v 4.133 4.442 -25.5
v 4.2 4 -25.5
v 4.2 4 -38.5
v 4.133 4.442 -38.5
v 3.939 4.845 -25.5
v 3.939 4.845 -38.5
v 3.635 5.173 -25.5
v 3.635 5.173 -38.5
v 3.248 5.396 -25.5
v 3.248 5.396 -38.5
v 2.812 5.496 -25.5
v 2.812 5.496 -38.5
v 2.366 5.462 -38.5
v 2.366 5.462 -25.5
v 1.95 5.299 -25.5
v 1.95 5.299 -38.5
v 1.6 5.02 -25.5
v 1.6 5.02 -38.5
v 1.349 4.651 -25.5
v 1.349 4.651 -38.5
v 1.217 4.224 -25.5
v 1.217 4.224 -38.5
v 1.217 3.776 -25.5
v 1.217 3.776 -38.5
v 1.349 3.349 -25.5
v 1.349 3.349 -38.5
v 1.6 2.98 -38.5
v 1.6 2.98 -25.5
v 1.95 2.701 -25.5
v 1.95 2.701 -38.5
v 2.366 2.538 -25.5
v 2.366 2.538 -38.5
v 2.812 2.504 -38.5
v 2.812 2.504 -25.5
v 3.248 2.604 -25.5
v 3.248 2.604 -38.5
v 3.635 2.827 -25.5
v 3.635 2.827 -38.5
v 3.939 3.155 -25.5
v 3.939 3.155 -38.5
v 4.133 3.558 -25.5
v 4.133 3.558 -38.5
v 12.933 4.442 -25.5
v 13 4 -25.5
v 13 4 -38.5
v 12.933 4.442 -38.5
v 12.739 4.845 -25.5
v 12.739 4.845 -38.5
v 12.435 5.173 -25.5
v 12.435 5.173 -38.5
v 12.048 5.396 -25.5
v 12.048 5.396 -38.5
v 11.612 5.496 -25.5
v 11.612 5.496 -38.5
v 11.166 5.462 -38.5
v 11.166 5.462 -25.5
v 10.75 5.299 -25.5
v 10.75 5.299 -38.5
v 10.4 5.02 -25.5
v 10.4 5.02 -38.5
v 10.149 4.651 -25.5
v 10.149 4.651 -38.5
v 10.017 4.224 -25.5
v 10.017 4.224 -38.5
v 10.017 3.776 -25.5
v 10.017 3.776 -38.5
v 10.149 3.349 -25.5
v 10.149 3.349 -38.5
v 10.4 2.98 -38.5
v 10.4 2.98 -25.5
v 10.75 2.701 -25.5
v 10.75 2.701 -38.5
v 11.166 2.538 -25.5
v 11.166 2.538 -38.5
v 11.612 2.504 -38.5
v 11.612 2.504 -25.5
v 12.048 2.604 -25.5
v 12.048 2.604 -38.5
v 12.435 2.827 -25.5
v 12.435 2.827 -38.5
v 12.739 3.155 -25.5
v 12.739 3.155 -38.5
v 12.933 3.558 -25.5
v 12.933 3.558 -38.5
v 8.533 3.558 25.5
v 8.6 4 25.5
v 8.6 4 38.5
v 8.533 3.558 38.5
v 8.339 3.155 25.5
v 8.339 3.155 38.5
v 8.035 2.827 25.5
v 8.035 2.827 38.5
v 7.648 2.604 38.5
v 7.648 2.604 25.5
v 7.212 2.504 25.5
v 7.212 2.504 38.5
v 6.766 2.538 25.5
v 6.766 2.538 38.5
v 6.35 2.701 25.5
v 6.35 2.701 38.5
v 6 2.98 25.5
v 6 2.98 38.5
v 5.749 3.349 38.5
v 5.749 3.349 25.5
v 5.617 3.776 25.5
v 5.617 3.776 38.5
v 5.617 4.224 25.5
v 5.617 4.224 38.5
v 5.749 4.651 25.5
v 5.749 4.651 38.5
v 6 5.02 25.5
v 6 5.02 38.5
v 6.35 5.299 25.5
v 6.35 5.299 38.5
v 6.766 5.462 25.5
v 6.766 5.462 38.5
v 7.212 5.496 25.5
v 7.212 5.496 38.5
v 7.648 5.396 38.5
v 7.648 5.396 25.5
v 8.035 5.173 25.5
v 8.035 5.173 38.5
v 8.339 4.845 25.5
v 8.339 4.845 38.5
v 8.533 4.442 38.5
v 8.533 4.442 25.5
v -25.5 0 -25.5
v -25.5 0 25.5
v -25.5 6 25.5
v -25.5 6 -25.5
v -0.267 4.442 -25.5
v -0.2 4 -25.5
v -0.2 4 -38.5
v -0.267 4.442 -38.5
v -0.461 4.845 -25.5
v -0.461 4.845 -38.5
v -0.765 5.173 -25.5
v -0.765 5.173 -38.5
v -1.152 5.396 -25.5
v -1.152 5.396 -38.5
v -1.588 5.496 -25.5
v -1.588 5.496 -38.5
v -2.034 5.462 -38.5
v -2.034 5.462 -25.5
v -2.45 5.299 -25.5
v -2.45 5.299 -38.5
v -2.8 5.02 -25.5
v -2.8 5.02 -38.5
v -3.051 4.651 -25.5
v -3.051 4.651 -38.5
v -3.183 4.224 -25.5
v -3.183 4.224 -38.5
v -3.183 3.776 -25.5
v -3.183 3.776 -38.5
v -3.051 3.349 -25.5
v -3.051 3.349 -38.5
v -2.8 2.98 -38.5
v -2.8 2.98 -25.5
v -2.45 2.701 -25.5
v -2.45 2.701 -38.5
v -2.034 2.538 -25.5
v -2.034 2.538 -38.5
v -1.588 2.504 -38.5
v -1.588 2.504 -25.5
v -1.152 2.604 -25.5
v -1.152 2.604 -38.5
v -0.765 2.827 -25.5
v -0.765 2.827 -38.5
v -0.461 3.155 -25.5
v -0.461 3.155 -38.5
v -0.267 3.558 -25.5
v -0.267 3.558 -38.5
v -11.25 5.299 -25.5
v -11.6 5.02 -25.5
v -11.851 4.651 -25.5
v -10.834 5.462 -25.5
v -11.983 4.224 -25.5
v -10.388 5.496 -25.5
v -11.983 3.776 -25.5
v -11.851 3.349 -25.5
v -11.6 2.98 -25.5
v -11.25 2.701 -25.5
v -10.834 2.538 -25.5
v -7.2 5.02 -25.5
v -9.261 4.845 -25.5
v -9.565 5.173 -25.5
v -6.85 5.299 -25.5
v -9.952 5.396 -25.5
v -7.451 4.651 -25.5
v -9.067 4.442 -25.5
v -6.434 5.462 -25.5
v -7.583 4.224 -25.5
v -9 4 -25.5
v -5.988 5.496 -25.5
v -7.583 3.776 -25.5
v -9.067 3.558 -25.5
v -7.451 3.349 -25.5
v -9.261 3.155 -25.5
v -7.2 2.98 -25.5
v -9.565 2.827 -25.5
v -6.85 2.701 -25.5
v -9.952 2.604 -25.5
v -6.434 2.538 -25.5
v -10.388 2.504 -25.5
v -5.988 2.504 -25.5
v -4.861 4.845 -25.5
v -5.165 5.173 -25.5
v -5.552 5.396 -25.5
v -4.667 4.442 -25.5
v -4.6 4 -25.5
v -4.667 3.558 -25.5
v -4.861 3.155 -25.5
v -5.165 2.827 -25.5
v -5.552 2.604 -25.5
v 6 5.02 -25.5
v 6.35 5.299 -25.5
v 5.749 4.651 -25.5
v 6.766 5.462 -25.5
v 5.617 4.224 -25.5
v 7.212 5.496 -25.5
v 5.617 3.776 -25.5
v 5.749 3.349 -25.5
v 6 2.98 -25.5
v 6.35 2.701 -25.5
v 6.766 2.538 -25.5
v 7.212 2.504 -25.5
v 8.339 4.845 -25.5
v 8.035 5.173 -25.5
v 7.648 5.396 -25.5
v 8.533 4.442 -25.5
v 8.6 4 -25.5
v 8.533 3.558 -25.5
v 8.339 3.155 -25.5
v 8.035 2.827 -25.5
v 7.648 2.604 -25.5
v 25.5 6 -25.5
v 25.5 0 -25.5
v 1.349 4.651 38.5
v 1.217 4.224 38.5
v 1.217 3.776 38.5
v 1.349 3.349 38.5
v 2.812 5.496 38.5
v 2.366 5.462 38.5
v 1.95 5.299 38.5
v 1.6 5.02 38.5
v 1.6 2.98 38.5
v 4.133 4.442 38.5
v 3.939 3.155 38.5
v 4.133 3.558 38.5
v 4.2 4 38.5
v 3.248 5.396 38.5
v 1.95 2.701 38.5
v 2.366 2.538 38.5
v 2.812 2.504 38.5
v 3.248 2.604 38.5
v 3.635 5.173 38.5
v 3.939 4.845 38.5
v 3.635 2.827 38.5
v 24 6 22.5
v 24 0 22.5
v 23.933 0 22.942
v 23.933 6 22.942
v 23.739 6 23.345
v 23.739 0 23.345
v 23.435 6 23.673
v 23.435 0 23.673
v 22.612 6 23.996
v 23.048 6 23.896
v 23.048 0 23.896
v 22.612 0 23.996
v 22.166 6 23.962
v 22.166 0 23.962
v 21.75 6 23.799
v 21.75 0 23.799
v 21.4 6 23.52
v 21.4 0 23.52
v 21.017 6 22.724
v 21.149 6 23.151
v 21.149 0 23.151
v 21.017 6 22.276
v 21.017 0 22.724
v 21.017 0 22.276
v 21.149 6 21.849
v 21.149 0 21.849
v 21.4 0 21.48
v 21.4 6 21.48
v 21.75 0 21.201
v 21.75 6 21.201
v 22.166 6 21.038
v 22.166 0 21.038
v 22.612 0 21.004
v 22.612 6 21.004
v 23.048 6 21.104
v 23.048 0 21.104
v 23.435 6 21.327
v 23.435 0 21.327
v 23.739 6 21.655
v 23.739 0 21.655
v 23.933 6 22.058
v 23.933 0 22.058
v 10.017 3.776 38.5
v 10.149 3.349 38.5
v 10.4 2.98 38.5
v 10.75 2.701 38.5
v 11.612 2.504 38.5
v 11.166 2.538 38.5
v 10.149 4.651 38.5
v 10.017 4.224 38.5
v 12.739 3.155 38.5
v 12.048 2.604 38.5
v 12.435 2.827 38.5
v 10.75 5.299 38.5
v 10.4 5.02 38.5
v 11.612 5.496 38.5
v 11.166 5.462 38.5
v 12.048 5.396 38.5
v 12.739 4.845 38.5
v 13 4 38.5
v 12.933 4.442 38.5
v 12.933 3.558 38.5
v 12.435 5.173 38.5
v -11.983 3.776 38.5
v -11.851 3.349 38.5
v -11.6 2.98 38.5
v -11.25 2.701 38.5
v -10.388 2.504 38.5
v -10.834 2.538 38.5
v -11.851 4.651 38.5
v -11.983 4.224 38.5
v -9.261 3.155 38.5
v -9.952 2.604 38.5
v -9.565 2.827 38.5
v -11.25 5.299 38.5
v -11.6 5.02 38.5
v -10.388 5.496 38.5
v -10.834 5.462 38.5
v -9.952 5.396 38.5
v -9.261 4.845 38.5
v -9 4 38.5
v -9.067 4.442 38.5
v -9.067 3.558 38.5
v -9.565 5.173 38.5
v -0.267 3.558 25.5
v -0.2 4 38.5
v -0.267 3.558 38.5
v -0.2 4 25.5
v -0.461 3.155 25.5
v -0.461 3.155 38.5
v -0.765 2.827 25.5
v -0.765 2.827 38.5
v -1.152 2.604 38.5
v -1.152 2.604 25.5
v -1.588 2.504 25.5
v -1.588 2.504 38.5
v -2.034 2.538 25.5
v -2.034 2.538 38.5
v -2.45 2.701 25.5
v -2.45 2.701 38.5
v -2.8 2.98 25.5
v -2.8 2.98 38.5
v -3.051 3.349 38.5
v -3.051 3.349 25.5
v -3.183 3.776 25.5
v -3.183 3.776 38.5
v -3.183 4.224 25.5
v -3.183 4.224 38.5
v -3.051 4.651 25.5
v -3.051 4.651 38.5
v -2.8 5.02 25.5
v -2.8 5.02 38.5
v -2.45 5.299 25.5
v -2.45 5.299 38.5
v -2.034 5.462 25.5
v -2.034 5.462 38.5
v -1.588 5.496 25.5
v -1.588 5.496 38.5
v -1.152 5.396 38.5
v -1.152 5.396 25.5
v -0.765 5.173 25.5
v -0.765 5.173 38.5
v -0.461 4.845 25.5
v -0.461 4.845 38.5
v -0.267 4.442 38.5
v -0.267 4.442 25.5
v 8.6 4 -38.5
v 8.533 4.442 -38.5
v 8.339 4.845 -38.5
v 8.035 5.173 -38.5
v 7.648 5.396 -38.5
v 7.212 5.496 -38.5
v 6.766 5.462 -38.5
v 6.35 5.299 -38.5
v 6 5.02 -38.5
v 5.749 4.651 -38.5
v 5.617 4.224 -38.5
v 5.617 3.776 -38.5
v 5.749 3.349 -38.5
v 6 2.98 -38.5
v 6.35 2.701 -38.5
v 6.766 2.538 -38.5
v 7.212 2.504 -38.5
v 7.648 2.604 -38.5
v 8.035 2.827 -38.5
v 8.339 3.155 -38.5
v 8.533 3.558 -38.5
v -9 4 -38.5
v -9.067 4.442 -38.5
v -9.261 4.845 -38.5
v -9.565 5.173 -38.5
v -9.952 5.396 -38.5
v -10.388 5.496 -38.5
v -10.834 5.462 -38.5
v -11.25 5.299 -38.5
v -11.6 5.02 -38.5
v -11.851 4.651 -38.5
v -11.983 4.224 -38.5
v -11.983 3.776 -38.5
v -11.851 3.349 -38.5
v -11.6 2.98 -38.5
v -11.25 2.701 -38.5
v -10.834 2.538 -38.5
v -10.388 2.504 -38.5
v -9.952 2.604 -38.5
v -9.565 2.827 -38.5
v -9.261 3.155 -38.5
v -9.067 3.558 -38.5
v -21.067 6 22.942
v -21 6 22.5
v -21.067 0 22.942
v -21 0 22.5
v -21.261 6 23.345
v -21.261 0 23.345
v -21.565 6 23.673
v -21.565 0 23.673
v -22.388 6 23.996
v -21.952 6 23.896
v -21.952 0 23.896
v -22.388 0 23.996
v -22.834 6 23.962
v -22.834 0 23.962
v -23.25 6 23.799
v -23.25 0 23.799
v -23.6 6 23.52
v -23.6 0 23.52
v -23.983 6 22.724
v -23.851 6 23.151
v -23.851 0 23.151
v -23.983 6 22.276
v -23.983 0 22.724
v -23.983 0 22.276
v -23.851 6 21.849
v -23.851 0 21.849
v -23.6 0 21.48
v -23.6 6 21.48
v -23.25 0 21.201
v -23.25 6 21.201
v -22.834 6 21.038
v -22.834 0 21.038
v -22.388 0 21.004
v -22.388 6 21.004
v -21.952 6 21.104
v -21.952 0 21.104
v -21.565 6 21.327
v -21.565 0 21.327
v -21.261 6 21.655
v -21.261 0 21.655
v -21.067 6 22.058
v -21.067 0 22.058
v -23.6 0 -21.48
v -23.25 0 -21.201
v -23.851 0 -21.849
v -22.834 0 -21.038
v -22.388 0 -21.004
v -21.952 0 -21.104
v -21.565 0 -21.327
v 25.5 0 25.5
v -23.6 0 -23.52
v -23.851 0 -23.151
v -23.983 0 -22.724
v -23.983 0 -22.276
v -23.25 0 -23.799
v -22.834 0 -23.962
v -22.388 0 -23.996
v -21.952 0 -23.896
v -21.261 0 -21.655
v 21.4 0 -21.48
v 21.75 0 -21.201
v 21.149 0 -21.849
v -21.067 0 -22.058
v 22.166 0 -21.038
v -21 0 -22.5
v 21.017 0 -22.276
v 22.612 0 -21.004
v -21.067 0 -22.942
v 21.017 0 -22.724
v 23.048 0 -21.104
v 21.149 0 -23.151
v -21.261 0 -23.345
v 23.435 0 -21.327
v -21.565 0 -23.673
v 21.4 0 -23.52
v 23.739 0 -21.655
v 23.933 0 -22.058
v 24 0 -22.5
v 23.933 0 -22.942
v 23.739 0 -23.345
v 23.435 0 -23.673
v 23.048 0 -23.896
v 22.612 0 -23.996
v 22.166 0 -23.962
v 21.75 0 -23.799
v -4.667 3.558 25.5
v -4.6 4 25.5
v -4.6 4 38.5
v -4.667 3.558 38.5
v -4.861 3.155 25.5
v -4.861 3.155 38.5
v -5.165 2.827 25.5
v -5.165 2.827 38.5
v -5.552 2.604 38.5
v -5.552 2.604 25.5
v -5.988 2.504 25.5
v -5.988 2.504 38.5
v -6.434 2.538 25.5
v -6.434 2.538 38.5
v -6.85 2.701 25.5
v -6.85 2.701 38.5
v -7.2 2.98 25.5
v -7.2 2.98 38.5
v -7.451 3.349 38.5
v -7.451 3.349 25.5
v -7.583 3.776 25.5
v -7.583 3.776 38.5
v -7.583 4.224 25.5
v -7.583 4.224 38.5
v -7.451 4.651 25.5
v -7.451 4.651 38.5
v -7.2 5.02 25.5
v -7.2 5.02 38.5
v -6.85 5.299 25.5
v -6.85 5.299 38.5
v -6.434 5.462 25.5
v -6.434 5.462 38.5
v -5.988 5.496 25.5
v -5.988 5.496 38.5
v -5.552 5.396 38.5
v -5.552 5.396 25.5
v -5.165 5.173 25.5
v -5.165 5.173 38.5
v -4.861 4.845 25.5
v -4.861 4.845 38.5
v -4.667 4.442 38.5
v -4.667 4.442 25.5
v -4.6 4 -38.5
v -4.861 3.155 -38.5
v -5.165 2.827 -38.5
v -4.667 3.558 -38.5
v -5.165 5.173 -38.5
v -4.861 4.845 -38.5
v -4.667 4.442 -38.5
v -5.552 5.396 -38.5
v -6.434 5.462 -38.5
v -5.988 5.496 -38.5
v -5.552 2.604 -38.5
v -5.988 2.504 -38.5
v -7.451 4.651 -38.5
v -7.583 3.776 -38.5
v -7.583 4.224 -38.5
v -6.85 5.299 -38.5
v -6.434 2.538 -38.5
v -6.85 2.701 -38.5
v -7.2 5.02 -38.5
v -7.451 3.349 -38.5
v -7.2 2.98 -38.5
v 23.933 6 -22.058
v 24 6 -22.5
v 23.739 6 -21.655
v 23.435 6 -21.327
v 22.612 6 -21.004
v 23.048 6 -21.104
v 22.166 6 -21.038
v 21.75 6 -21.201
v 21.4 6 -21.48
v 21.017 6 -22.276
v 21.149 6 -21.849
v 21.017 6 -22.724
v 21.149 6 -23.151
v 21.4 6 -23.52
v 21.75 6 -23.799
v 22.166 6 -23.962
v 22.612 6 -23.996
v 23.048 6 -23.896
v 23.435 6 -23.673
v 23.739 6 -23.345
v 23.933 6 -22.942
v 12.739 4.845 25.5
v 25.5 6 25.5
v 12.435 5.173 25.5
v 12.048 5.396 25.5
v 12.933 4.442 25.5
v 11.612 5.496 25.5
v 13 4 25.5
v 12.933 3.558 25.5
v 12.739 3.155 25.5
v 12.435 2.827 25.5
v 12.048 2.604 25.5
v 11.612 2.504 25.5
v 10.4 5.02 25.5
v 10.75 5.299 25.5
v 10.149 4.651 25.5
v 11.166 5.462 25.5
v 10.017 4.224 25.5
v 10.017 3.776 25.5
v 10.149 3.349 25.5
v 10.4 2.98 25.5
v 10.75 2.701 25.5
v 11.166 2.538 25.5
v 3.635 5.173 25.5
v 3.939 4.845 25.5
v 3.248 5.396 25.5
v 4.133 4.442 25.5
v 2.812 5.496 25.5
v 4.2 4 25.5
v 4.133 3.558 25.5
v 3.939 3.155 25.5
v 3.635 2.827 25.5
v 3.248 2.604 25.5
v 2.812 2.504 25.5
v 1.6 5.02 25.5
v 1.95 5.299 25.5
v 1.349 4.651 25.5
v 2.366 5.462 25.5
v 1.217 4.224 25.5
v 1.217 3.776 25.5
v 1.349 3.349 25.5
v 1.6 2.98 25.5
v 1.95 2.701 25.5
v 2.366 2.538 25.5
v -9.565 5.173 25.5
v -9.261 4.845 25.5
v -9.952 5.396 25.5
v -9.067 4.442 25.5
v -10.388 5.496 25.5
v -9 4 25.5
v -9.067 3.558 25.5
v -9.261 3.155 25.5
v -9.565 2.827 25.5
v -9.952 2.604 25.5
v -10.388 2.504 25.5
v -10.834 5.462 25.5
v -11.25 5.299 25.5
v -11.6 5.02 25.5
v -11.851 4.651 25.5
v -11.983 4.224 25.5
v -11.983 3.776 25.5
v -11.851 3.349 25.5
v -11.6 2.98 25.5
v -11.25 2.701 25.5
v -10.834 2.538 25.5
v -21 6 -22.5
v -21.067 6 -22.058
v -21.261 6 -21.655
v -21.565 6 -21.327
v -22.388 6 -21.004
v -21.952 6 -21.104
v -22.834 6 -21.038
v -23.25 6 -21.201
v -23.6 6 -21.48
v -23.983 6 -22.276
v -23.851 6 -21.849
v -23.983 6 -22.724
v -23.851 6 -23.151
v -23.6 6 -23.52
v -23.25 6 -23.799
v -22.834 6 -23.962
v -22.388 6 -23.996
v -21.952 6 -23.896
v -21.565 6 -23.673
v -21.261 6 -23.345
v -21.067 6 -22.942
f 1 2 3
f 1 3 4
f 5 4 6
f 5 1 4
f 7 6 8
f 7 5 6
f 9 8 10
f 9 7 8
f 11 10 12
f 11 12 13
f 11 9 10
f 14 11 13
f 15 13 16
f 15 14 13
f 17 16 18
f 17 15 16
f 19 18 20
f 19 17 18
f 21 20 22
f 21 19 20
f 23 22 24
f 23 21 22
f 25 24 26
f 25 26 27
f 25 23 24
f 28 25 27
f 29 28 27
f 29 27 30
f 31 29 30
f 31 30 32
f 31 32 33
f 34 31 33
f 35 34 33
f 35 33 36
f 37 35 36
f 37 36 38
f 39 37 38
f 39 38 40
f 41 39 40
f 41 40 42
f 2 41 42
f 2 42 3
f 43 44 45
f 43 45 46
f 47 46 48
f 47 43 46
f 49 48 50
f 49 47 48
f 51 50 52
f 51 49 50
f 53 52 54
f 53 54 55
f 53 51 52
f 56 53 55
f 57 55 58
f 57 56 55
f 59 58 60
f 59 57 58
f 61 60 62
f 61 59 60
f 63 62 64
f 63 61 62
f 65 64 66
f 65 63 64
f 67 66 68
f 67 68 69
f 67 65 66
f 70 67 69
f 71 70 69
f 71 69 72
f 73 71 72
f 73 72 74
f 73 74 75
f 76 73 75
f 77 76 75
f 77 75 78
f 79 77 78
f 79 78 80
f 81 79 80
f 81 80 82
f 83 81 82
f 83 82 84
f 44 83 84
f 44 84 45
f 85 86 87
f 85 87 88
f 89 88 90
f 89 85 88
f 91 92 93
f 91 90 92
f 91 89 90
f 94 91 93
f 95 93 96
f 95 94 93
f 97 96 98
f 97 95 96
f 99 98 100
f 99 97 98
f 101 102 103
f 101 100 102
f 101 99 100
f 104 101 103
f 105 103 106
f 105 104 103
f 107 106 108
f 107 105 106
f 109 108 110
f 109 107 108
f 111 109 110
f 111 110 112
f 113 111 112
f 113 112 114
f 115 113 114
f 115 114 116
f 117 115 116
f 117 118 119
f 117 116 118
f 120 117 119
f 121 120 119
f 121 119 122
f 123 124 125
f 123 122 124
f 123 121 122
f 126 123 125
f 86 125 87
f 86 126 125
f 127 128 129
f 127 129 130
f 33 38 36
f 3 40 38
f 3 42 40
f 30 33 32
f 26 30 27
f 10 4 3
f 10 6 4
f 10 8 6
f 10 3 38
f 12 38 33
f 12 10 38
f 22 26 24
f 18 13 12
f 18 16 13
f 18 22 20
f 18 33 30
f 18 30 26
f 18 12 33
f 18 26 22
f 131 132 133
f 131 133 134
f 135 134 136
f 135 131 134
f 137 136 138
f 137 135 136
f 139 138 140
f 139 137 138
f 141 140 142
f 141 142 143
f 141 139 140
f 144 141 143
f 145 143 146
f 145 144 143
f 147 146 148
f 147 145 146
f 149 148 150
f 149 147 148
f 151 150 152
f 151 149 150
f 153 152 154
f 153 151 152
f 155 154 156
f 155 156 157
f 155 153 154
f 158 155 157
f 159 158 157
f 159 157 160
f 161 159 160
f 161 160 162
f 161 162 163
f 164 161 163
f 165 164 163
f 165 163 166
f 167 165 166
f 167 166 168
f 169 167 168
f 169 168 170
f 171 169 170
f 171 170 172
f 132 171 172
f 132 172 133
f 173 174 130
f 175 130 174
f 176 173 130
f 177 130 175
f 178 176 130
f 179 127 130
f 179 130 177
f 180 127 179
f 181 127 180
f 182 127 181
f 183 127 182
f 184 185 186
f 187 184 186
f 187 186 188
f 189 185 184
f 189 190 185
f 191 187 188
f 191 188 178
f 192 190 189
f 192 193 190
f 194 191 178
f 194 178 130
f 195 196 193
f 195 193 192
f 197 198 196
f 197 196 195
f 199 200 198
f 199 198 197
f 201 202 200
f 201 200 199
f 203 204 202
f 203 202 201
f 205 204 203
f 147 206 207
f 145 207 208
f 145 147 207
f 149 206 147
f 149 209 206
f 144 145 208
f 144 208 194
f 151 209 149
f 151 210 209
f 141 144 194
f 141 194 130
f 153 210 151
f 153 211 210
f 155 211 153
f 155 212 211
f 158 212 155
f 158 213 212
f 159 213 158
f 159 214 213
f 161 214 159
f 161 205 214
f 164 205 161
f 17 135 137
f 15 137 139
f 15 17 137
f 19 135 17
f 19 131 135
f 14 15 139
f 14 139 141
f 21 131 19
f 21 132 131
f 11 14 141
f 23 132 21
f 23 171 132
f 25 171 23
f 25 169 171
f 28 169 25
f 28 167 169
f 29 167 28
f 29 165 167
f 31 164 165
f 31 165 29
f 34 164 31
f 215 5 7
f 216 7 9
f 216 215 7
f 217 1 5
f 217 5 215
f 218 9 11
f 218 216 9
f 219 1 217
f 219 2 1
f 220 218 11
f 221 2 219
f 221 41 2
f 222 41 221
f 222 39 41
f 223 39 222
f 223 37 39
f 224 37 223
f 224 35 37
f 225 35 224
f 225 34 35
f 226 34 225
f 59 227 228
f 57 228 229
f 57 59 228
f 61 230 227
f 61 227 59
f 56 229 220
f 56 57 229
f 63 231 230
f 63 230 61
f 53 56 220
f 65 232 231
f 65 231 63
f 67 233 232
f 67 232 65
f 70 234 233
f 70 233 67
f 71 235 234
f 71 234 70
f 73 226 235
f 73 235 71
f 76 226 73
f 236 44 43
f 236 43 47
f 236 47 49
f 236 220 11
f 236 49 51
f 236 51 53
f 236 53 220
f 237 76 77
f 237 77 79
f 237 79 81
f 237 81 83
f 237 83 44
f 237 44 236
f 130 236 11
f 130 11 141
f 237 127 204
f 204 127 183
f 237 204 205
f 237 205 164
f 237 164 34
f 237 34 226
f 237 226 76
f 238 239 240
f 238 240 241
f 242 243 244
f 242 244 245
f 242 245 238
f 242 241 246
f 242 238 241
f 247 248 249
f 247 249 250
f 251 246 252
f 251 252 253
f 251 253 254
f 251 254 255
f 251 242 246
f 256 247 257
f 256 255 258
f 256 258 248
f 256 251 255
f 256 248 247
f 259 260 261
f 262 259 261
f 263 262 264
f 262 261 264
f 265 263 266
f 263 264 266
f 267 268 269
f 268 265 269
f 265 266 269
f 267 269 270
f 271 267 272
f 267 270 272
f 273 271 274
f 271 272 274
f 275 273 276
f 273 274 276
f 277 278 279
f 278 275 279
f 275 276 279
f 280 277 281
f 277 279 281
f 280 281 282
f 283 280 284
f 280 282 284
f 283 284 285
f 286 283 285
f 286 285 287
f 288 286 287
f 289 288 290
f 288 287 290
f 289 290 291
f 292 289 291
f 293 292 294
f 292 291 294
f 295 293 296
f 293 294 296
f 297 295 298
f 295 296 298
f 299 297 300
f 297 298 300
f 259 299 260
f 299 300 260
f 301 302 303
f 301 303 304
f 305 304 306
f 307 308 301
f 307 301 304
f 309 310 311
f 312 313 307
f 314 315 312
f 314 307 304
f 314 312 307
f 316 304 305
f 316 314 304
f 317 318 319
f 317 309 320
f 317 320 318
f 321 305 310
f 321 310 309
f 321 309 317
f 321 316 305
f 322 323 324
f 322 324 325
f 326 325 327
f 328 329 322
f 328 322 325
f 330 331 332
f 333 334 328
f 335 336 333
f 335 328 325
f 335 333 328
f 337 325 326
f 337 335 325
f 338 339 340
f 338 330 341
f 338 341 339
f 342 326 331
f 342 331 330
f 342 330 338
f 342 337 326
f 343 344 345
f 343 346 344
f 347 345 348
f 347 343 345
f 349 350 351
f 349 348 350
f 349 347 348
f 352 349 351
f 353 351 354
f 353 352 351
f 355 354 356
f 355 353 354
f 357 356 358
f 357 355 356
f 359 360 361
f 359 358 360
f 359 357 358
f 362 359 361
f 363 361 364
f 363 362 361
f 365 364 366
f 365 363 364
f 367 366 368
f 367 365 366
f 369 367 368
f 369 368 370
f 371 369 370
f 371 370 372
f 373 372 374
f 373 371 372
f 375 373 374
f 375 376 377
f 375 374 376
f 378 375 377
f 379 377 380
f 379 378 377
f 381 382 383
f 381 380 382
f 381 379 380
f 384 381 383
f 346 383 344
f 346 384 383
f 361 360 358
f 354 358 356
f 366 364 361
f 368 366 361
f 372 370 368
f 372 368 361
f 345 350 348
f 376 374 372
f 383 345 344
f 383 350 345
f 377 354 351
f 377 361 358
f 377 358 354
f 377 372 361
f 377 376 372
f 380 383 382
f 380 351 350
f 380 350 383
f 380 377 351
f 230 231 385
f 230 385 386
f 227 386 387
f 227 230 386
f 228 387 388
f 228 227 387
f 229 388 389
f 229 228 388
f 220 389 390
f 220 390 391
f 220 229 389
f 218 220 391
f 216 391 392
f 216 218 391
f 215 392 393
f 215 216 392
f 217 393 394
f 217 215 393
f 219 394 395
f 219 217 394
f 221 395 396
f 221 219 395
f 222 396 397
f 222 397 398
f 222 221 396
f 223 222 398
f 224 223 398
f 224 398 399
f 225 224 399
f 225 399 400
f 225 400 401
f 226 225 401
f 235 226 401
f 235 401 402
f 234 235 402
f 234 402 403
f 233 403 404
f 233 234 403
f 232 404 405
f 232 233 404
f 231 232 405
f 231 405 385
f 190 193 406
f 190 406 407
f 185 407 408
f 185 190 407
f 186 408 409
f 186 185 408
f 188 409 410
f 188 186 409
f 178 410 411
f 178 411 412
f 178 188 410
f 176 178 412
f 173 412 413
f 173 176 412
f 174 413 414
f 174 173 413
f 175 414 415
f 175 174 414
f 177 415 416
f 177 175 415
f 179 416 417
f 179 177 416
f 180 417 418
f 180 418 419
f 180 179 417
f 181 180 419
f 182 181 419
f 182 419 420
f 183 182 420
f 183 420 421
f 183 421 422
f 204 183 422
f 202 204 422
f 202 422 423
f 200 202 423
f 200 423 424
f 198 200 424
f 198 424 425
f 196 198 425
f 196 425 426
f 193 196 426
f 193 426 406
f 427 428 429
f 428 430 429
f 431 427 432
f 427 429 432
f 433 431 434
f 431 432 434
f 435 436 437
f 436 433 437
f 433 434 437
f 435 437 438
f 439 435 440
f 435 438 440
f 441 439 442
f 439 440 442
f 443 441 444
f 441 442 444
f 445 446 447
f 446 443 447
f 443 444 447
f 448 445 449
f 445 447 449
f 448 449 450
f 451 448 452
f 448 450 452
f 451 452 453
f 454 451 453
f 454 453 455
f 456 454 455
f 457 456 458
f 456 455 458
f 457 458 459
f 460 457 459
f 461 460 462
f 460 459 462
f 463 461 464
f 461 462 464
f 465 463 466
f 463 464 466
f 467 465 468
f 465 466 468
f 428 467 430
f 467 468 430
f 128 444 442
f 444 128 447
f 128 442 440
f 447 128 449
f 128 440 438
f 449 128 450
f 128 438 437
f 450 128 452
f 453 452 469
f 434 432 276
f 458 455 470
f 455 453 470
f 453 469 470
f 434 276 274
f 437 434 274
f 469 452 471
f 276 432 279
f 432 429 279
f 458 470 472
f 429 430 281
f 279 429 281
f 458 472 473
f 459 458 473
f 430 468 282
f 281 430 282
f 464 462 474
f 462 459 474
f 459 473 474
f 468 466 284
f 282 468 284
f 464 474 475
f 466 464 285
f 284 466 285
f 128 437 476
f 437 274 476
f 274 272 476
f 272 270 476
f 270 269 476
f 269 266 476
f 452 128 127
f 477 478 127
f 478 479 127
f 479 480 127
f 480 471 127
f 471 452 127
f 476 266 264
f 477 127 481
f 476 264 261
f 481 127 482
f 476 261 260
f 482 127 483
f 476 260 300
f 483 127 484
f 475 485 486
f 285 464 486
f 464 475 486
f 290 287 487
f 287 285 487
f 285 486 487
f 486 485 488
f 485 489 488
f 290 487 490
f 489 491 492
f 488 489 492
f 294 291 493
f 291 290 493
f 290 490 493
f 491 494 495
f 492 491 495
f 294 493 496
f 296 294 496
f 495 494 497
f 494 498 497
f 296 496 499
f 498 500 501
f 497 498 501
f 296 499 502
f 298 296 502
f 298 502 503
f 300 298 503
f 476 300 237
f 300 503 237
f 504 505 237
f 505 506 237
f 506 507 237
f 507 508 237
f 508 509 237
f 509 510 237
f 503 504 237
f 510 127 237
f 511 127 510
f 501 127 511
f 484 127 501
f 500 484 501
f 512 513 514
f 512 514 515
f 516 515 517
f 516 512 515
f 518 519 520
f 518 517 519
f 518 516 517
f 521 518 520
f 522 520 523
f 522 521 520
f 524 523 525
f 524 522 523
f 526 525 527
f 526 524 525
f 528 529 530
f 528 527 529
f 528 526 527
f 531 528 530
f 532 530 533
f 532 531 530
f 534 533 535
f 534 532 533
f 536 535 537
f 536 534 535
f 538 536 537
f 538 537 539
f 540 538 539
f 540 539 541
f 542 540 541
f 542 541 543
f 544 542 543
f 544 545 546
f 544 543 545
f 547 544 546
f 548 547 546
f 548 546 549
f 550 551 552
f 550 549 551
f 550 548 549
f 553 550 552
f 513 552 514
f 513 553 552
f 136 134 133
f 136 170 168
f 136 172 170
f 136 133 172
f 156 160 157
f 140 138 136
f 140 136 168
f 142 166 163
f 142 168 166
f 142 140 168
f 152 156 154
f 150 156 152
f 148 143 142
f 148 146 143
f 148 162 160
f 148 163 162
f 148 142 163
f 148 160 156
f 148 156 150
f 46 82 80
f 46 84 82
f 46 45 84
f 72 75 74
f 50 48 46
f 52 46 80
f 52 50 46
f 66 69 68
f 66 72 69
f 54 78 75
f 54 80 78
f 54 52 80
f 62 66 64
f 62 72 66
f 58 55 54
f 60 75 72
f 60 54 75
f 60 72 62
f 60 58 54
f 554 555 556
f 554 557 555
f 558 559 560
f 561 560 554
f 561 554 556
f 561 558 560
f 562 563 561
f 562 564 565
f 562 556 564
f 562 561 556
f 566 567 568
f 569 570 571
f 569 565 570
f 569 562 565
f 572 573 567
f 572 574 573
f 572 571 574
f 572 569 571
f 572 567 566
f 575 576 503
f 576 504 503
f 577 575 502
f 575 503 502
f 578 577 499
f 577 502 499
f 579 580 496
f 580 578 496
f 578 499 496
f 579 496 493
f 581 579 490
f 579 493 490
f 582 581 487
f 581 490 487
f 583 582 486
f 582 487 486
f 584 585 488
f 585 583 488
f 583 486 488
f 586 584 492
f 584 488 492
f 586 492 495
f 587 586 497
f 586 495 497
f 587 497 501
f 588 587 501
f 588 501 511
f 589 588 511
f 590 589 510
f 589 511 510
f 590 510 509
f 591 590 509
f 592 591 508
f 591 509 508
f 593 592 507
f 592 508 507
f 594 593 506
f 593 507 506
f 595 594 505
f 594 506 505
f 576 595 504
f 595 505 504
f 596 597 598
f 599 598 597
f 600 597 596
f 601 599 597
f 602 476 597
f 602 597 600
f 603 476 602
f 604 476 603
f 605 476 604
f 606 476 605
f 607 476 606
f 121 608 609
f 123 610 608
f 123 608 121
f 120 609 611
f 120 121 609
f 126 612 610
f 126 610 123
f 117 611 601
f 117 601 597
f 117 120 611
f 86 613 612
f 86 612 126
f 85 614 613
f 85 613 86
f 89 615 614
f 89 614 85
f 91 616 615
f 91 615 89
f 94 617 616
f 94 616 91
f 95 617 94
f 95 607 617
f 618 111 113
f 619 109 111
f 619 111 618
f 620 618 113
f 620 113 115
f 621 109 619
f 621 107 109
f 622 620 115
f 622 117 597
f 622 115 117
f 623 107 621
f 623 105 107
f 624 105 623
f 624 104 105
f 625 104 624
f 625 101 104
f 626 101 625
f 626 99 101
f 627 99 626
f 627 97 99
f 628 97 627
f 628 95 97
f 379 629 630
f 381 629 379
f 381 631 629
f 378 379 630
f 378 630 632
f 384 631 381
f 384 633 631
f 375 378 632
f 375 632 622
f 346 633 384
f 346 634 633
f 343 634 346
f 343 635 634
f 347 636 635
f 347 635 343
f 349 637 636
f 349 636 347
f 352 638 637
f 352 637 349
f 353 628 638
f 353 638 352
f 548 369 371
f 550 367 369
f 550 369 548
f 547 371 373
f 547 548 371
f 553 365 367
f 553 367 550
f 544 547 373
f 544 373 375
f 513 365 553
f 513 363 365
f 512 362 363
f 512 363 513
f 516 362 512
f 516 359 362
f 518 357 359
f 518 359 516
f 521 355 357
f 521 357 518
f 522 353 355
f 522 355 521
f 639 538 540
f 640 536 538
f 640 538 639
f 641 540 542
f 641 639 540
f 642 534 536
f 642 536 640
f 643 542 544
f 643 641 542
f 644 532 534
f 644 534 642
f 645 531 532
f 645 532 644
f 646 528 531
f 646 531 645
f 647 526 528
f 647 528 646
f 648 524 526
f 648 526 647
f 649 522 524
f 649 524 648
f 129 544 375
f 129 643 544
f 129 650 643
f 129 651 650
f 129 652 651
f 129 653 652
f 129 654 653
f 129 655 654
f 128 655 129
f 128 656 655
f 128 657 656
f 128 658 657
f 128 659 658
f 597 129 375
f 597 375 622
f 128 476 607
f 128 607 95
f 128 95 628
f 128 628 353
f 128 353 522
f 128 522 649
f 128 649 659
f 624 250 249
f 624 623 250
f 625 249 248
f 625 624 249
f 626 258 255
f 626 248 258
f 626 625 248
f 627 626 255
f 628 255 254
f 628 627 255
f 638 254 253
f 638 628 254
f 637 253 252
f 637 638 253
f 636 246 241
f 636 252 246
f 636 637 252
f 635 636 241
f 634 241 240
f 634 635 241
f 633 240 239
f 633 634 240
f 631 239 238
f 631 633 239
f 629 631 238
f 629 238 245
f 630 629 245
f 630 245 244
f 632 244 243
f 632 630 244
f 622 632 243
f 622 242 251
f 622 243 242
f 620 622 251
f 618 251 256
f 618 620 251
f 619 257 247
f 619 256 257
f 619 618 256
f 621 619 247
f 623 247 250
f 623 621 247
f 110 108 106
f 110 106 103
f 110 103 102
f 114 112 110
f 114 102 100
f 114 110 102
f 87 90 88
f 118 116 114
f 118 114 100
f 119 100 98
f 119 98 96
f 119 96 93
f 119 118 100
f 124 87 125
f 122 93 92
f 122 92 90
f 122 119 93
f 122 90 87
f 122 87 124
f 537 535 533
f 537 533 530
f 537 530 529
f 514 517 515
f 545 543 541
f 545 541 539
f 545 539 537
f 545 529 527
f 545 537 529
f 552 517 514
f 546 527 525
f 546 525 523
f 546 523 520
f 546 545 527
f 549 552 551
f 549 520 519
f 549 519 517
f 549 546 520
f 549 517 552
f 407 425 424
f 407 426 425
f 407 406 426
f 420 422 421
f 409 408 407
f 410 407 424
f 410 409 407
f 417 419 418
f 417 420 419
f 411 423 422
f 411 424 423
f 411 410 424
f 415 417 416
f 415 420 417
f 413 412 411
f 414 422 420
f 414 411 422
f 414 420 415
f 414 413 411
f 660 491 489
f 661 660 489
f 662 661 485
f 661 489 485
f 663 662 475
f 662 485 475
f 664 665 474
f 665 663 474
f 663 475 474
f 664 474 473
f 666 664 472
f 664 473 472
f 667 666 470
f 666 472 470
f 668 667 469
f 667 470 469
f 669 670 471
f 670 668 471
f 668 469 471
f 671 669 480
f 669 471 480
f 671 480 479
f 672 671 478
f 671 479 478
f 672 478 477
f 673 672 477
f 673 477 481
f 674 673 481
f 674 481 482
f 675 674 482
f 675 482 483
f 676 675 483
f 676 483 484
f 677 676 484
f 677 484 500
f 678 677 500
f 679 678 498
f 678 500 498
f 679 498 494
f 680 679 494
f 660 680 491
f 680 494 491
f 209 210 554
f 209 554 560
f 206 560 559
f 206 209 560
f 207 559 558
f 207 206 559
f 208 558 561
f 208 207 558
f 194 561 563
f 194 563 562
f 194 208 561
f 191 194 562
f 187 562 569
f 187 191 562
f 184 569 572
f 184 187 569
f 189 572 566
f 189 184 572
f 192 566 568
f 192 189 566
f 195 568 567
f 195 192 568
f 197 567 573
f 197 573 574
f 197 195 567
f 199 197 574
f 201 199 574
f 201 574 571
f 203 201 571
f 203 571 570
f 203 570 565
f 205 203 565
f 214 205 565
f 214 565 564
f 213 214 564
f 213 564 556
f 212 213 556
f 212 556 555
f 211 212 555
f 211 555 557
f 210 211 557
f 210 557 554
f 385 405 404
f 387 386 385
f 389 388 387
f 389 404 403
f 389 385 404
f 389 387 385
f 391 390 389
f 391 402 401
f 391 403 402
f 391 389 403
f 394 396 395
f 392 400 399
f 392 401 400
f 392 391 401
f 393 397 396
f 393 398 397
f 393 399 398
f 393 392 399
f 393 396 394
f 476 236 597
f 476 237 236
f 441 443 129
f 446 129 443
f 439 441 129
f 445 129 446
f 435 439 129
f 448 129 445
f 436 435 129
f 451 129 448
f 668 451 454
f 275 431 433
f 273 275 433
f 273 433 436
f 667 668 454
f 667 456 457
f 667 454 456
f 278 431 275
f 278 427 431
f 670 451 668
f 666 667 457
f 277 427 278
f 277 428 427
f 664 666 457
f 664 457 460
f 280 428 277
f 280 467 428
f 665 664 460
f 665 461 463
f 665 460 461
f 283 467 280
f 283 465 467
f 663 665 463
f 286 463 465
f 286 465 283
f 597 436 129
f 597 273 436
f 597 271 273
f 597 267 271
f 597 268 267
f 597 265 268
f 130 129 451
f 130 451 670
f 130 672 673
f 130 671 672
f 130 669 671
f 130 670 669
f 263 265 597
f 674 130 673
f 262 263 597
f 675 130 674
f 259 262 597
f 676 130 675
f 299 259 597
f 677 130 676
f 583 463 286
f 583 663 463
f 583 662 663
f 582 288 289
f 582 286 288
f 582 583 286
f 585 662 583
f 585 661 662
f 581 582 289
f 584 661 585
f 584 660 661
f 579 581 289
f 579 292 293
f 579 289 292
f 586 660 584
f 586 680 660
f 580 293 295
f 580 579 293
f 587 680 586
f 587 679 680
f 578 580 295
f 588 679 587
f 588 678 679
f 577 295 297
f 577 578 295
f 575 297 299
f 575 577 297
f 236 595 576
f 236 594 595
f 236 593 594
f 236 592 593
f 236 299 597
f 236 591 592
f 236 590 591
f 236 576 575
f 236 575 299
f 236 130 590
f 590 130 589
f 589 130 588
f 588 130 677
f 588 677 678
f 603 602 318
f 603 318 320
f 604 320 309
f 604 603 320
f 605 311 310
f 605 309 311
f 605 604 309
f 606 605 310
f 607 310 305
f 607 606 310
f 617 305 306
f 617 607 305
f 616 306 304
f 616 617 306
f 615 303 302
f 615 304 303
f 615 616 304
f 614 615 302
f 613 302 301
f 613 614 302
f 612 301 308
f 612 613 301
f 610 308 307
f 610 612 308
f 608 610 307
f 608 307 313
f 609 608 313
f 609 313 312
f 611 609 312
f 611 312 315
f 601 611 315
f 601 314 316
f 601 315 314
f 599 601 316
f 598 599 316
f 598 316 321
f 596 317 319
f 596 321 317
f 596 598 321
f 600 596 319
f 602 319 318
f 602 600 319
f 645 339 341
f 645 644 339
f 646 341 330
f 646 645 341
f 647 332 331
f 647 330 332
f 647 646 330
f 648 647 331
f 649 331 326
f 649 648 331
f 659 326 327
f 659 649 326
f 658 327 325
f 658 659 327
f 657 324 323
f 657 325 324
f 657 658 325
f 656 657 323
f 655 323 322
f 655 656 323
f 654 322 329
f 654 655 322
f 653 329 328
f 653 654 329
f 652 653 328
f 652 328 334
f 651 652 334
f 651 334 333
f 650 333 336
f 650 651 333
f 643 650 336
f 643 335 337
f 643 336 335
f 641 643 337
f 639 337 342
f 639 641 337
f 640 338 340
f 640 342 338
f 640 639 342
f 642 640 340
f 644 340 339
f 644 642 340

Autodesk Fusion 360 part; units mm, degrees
sketch "Sketch1" plane through (0, 0, 0) normal (0, 1, 0) x (1, 0, 0)
  line L0 (25.5, -25.5) -> (-25.5, -25.5)
  line L1 (-25.5, -25.5) -> (-25.5, 25.5)
  line L2 (-25.5, 25.5) -> (25.5, 25.5)
  line L3 (25.5, 25.5) -> (25.5, -25.5)
  line L4 (25.5, -25.5) -> (-25.5, 25.5) construction
  line L5 (-25.5, -25.5) -> (25.5, 25.5) construction
  circle A0 centre (-22.5, 22.5) radius 1.5
  circle A1 centre (22.5, 22.5) radius 1.5
  circle A2 centre (22.5, -22.5) radius 1.5
  circle A3 centre (-22.5, -22.5) radius 1.5
  dimension "d1" = 51
  dimension "d2" = 51
  dimension "d5" = 3
  dimension "d6" = 45
extrude "Extrude1" add sketch "Sketch1" along normal blind 6
sketch "Sketch2" plane through (0, 0, 25.5) normal (0, 0, 1) x (1, 0, 0)
  line L0 (-25.5, 0) -> (25.5, 0)
  line L1 (25.5, 0) -> (25.5, 6)
  line L2 (25.5, 6) -> (-25.5, 6)
  line L3 (-25.5, 6) -> (-25.5, 0)
  circle A0 centre (-10.5, 4) radius 1.5
  circle A1 centre (-6.1, 4) radius 1.5
  circle A2 centre (-1.7, 4) radius 1.5
  circle A3 centre (2.7, 4) radius 1.5
  circle A4 centre (7.1, 4) radius 1.5
  circle A5 centre (11.5, 4) radius 1.5
  dimension "d7" = 3
  dimension "d8" = 2
  dimension "d9" = 15
  dimension "d12" = -22
  dimension "d13" = 0
extrude "Extrude2" add sketch "Sketch2" along normal blind 13 contours A0 | A1 | A2 | A3 | A4 | A5
mirror "Mirror1" about plane through (0, 0, 0) normal (0, 0, 1) of "Extrude2"
